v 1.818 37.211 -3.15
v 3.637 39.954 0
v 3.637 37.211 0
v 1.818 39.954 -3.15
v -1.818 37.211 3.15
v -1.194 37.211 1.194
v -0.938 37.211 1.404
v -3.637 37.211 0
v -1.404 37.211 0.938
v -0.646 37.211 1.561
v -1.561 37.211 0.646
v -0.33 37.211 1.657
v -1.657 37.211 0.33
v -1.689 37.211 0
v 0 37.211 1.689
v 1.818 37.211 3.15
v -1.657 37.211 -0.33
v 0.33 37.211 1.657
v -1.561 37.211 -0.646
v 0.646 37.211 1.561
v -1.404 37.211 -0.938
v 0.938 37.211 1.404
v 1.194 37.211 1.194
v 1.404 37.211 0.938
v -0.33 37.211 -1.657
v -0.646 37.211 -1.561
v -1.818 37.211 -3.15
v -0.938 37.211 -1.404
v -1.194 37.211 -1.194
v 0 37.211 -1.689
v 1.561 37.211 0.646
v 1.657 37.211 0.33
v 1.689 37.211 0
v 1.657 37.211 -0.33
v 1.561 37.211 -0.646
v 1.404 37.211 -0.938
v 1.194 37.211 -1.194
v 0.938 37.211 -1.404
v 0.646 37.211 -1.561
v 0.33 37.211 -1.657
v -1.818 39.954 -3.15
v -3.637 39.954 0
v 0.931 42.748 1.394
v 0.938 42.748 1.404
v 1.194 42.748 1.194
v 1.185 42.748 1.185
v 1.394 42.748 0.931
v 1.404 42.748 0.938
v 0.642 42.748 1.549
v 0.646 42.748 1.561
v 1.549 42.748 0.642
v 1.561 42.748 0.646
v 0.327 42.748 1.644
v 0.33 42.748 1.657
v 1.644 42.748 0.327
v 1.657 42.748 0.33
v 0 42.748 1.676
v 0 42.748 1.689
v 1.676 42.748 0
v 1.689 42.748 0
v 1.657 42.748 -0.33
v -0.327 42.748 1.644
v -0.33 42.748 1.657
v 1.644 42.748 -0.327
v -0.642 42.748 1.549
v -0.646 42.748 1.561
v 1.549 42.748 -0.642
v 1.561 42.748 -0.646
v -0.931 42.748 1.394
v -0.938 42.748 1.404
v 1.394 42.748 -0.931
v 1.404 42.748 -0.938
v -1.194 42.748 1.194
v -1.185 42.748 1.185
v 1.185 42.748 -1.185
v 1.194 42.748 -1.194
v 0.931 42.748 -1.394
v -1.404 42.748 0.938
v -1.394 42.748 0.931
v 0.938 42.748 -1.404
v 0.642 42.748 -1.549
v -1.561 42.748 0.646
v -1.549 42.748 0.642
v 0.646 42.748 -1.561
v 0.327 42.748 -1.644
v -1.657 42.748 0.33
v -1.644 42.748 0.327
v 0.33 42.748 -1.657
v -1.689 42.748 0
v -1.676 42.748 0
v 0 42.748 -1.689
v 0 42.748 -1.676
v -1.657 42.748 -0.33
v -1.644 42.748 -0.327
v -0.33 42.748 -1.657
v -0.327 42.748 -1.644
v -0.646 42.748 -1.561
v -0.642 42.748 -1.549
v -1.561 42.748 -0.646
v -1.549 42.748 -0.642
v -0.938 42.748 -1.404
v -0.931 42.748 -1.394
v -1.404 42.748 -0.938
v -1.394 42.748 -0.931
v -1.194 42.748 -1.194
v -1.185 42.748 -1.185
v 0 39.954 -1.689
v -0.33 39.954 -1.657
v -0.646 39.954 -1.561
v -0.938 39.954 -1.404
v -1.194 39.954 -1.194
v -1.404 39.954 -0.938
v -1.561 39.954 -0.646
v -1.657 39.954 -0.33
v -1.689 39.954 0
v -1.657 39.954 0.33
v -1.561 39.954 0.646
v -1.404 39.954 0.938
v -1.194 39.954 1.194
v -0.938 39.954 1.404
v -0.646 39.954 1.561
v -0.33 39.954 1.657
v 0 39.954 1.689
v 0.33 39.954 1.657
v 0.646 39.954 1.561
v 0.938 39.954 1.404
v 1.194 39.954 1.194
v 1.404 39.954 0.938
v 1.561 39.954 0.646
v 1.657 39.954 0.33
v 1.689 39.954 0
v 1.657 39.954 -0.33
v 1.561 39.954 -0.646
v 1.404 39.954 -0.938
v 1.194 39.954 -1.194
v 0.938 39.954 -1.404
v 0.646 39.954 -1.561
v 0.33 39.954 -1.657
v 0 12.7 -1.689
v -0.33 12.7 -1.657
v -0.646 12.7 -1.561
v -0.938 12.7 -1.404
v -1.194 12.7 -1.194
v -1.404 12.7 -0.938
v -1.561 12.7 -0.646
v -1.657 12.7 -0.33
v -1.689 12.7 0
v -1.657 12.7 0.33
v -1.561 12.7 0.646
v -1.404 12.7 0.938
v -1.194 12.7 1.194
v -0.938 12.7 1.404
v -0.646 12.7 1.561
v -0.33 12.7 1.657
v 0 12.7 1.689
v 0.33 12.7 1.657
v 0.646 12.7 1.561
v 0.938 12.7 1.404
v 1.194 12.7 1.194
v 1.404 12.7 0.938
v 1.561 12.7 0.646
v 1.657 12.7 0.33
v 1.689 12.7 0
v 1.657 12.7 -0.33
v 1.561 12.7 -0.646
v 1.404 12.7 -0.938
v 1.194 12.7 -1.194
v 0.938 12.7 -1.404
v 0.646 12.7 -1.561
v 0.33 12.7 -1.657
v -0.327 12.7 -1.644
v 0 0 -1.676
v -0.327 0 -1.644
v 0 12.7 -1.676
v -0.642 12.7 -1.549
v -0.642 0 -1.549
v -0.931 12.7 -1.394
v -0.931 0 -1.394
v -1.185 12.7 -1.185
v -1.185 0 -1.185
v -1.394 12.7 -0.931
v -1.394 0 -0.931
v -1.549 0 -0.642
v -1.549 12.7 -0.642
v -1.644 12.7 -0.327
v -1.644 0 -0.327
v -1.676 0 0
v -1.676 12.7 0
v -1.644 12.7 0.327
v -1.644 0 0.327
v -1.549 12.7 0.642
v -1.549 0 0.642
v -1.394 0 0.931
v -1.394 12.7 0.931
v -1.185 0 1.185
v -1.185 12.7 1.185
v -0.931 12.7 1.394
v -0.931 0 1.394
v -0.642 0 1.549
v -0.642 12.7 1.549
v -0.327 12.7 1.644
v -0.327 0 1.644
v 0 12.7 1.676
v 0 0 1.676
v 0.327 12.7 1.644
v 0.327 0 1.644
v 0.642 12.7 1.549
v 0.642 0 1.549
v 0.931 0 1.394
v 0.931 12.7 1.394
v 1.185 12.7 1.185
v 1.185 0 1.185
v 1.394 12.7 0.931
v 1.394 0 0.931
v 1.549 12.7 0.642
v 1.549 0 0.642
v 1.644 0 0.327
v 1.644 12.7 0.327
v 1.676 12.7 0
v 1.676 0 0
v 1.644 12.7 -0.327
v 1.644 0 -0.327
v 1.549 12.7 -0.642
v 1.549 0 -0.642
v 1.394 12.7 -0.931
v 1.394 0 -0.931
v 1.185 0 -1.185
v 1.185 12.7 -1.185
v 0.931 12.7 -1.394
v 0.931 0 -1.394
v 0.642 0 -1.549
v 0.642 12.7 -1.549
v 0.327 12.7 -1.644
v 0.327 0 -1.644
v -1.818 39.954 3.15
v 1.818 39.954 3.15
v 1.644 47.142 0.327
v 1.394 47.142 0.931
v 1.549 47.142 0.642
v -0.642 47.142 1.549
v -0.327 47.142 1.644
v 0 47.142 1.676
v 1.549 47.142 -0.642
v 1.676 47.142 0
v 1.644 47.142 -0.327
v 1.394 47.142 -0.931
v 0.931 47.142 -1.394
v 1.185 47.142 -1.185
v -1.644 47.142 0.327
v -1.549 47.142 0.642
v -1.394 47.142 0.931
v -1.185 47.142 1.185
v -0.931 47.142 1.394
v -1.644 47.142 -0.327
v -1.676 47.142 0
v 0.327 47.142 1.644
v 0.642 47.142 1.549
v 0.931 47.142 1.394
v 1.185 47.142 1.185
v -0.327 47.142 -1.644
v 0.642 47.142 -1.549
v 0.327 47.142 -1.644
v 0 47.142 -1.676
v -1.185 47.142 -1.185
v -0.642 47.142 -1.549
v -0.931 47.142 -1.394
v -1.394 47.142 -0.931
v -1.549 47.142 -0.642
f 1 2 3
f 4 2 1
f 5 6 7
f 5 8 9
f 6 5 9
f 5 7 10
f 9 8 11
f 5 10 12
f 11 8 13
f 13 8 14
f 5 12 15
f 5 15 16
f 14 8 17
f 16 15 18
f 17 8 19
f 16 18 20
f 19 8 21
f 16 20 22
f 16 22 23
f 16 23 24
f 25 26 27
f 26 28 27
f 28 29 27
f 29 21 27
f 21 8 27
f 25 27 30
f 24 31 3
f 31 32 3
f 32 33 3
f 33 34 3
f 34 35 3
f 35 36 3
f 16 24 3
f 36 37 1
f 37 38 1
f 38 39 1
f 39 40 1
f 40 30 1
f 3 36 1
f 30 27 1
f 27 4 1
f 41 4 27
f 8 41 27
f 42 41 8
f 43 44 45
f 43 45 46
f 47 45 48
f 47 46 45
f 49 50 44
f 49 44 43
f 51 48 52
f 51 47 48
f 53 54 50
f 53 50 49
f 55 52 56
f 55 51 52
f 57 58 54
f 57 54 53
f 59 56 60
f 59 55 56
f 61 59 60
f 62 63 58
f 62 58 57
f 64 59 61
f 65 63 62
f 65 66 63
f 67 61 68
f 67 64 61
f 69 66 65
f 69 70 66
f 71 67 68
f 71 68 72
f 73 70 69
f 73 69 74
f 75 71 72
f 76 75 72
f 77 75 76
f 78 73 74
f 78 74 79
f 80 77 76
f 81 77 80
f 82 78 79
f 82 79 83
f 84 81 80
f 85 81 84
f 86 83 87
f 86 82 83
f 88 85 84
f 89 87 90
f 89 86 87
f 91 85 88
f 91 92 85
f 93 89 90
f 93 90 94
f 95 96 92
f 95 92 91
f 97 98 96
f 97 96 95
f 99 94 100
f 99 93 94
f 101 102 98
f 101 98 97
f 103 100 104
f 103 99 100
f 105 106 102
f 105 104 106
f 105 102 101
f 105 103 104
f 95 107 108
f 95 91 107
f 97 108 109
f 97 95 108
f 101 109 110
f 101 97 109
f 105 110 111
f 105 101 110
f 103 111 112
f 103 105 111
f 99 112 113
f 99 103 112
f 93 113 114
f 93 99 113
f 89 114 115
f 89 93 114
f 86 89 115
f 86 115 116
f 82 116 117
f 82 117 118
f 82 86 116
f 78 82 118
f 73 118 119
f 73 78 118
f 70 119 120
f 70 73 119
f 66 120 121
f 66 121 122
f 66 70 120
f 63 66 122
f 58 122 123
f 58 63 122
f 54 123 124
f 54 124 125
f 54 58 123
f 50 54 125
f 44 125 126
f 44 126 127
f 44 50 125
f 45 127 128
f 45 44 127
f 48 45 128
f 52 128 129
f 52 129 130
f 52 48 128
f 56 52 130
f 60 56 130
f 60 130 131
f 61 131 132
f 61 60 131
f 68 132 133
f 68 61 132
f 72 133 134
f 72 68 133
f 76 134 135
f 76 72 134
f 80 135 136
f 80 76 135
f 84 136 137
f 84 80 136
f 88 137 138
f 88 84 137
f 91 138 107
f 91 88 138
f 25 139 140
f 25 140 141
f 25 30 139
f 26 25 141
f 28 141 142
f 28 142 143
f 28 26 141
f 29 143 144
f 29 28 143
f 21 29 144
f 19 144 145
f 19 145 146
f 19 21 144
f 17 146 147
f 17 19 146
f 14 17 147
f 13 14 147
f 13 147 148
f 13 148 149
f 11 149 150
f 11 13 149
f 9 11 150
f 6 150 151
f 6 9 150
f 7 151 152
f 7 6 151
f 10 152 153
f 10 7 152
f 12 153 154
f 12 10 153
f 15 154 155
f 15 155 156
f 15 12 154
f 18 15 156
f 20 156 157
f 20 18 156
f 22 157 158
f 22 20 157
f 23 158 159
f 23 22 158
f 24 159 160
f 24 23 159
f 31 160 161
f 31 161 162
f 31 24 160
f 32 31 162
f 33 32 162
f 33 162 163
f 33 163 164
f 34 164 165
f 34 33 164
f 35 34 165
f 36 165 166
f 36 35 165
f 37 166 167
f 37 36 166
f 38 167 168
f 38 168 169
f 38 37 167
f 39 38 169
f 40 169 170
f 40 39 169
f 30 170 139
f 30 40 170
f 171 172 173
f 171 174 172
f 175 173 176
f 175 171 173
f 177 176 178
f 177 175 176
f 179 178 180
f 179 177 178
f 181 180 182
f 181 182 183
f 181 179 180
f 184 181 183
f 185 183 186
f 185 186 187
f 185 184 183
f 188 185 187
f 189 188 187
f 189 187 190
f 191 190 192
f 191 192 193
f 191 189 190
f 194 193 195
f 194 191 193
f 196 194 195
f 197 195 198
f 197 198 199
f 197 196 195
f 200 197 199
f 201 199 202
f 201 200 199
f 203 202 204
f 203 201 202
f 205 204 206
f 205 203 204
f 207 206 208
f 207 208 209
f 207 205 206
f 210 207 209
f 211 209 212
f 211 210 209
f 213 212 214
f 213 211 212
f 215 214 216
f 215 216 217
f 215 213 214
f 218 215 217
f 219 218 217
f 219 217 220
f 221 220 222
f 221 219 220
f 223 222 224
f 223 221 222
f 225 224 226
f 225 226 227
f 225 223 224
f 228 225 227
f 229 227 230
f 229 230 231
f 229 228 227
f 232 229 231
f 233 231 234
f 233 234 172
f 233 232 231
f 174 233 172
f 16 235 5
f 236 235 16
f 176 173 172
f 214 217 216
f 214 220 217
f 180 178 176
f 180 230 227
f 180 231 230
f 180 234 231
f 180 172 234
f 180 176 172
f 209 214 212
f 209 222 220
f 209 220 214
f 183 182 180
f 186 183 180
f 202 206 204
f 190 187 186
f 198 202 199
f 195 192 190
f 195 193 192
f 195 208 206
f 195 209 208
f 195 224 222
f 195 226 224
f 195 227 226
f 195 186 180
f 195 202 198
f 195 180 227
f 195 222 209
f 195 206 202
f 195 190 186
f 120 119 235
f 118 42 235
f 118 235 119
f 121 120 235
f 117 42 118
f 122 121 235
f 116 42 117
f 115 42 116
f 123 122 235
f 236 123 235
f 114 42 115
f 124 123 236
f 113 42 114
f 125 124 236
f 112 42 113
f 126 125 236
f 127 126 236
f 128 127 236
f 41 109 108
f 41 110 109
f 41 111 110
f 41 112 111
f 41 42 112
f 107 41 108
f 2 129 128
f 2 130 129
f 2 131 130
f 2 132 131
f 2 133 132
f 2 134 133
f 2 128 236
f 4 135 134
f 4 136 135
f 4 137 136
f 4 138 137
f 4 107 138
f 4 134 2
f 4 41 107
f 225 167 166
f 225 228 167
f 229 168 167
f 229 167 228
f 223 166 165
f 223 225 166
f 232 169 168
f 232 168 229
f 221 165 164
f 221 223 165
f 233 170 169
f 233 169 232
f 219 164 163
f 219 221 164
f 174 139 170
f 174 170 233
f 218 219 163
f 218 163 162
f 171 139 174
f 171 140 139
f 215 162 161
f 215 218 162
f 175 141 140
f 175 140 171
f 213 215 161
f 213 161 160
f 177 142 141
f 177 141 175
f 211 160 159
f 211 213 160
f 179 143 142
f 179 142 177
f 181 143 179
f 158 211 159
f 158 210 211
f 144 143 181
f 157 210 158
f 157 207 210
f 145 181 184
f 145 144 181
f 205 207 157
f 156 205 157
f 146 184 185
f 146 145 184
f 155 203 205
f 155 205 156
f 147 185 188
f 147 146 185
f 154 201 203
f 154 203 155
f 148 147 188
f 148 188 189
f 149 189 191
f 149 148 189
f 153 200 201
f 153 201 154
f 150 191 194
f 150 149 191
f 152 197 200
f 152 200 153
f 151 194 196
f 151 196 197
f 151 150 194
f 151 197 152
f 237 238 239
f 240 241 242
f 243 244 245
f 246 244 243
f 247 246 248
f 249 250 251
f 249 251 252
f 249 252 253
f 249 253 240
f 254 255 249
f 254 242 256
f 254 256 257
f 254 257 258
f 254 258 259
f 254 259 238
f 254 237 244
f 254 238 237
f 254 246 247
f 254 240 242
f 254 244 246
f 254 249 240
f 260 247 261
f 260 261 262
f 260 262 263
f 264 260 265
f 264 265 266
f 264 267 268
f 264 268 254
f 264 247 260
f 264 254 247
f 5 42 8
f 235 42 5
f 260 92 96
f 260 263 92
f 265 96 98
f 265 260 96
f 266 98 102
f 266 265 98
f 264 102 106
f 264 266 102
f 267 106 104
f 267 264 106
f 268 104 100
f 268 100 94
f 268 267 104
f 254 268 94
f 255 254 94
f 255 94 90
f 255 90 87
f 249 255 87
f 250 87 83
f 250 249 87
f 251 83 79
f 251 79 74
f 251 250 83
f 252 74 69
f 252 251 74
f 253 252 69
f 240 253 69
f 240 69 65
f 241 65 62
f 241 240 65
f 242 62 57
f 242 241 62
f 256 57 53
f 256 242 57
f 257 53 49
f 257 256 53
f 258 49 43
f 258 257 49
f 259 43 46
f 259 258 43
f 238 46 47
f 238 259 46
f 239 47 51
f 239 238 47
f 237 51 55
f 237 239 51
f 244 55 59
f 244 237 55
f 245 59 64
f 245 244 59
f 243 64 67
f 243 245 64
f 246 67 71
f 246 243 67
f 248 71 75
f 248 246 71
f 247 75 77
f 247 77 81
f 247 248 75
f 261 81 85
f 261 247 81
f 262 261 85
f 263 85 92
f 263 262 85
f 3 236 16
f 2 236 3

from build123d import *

# Parameters (mm, degrees)
BOSS_EXTRUDE1_DEPTH = 2.7432


with BuildPart() as part:
    # Sketch1 → Revolve1 (revolve)
    with BuildSketch(Plane.XY, mode=Mode.PRIVATE) as revolve1_sk:
        Polygon((0, 0), (1.6764, 0), (1.6764, 12.7), (1.6891, 12.7), (1.6891, 37.211), (3.1115, 37.211), (3.1115, 39.9542), (1.6891, 39.9542), (1.6891, 42.7482), (1.6764, 42.7482), (1.6764, 47.1424), (0, 47.1424), align=None)
    revolve(revolve1_sk.sketch.rotate(Axis((0, 0, 0), (0, 1, 0)), 90), axis=Axis((0, 0, 0), (0, 1, 0)))  # turned: the seam where the file's is

    # Sketch2 → Boss-Extrude1 (add)
    with BuildSketch(Plane(origin=(0, 39.9542, 0), x_dir=(1, 0, 0), z_dir=(0, 1, 0))):
        Polygon((3.636844816, 0), (1.818422408, 3.1496), (-1.818422408, 3.1496), (-3.636844816, 0), (-1.818422408, -3.1496), (1.818422408, -3.1496), align=None)
    extrude(amount=-BOSS_EXTRUDE1_DEPTH)


solid = part.part
